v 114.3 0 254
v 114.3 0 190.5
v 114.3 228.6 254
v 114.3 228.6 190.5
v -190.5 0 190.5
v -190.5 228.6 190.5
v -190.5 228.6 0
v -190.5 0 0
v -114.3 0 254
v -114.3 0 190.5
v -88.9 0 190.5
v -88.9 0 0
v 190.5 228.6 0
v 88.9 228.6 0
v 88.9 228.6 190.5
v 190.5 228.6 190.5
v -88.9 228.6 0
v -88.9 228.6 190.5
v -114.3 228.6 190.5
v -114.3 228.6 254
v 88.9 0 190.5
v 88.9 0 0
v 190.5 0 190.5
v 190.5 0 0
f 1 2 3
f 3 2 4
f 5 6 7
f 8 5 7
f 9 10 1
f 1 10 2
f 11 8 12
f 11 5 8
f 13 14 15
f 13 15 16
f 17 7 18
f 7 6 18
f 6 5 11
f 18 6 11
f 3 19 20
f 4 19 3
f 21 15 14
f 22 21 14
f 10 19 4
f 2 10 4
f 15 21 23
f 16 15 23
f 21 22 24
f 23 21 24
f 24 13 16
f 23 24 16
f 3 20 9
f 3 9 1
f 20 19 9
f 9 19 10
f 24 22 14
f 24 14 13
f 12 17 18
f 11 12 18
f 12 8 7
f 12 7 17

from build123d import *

# Parameters (mm, degrees)
F0_W     = 101.6
F0_H     = 63.5
F1_DEPTH = 228.6
F2_W     = 228.6
F2_H     = 114.3
F3_DEPTH = 63.5


with BuildPart() as f1:
    # F0 (on Front) → F1 (new body)
    with BuildSketch(Plane.XZ):
        with Locations((-139.7, 31.75)):
            Rectangle(F0_W, F0_H)
        with Locations((-139.7, 95.25)):
            Rectangle(F0_W, F0_H)
        with Locations((-139.7, 158.75)):
            Rectangle(F0_W, F0_H)
        with Locations((139.7, 95.25)):
            Rectangle(F0_W, F0_H)
        with Locations((139.7, 158.75)):
            Rectangle(F0_W, F0_H)
        with Locations((139.7, 31.75)):
            Rectangle(F0_W, F0_H)
    extrude(amount=-F1_DEPTH)


with BuildPart() as f3:
    # F2 (on face) → F3 (new body)
    with BuildSketch(Plane.XY.offset(190.5)):
        with Locations((0, 171.45)):
            Rectangle(F2_W, F2_H)
        with Locations((0, 57.15)):
            Rectangle(F2_W, F2_H)
    extrude(amount=F3_DEPTH)


solid = Compound([f1.part, f3.part])
